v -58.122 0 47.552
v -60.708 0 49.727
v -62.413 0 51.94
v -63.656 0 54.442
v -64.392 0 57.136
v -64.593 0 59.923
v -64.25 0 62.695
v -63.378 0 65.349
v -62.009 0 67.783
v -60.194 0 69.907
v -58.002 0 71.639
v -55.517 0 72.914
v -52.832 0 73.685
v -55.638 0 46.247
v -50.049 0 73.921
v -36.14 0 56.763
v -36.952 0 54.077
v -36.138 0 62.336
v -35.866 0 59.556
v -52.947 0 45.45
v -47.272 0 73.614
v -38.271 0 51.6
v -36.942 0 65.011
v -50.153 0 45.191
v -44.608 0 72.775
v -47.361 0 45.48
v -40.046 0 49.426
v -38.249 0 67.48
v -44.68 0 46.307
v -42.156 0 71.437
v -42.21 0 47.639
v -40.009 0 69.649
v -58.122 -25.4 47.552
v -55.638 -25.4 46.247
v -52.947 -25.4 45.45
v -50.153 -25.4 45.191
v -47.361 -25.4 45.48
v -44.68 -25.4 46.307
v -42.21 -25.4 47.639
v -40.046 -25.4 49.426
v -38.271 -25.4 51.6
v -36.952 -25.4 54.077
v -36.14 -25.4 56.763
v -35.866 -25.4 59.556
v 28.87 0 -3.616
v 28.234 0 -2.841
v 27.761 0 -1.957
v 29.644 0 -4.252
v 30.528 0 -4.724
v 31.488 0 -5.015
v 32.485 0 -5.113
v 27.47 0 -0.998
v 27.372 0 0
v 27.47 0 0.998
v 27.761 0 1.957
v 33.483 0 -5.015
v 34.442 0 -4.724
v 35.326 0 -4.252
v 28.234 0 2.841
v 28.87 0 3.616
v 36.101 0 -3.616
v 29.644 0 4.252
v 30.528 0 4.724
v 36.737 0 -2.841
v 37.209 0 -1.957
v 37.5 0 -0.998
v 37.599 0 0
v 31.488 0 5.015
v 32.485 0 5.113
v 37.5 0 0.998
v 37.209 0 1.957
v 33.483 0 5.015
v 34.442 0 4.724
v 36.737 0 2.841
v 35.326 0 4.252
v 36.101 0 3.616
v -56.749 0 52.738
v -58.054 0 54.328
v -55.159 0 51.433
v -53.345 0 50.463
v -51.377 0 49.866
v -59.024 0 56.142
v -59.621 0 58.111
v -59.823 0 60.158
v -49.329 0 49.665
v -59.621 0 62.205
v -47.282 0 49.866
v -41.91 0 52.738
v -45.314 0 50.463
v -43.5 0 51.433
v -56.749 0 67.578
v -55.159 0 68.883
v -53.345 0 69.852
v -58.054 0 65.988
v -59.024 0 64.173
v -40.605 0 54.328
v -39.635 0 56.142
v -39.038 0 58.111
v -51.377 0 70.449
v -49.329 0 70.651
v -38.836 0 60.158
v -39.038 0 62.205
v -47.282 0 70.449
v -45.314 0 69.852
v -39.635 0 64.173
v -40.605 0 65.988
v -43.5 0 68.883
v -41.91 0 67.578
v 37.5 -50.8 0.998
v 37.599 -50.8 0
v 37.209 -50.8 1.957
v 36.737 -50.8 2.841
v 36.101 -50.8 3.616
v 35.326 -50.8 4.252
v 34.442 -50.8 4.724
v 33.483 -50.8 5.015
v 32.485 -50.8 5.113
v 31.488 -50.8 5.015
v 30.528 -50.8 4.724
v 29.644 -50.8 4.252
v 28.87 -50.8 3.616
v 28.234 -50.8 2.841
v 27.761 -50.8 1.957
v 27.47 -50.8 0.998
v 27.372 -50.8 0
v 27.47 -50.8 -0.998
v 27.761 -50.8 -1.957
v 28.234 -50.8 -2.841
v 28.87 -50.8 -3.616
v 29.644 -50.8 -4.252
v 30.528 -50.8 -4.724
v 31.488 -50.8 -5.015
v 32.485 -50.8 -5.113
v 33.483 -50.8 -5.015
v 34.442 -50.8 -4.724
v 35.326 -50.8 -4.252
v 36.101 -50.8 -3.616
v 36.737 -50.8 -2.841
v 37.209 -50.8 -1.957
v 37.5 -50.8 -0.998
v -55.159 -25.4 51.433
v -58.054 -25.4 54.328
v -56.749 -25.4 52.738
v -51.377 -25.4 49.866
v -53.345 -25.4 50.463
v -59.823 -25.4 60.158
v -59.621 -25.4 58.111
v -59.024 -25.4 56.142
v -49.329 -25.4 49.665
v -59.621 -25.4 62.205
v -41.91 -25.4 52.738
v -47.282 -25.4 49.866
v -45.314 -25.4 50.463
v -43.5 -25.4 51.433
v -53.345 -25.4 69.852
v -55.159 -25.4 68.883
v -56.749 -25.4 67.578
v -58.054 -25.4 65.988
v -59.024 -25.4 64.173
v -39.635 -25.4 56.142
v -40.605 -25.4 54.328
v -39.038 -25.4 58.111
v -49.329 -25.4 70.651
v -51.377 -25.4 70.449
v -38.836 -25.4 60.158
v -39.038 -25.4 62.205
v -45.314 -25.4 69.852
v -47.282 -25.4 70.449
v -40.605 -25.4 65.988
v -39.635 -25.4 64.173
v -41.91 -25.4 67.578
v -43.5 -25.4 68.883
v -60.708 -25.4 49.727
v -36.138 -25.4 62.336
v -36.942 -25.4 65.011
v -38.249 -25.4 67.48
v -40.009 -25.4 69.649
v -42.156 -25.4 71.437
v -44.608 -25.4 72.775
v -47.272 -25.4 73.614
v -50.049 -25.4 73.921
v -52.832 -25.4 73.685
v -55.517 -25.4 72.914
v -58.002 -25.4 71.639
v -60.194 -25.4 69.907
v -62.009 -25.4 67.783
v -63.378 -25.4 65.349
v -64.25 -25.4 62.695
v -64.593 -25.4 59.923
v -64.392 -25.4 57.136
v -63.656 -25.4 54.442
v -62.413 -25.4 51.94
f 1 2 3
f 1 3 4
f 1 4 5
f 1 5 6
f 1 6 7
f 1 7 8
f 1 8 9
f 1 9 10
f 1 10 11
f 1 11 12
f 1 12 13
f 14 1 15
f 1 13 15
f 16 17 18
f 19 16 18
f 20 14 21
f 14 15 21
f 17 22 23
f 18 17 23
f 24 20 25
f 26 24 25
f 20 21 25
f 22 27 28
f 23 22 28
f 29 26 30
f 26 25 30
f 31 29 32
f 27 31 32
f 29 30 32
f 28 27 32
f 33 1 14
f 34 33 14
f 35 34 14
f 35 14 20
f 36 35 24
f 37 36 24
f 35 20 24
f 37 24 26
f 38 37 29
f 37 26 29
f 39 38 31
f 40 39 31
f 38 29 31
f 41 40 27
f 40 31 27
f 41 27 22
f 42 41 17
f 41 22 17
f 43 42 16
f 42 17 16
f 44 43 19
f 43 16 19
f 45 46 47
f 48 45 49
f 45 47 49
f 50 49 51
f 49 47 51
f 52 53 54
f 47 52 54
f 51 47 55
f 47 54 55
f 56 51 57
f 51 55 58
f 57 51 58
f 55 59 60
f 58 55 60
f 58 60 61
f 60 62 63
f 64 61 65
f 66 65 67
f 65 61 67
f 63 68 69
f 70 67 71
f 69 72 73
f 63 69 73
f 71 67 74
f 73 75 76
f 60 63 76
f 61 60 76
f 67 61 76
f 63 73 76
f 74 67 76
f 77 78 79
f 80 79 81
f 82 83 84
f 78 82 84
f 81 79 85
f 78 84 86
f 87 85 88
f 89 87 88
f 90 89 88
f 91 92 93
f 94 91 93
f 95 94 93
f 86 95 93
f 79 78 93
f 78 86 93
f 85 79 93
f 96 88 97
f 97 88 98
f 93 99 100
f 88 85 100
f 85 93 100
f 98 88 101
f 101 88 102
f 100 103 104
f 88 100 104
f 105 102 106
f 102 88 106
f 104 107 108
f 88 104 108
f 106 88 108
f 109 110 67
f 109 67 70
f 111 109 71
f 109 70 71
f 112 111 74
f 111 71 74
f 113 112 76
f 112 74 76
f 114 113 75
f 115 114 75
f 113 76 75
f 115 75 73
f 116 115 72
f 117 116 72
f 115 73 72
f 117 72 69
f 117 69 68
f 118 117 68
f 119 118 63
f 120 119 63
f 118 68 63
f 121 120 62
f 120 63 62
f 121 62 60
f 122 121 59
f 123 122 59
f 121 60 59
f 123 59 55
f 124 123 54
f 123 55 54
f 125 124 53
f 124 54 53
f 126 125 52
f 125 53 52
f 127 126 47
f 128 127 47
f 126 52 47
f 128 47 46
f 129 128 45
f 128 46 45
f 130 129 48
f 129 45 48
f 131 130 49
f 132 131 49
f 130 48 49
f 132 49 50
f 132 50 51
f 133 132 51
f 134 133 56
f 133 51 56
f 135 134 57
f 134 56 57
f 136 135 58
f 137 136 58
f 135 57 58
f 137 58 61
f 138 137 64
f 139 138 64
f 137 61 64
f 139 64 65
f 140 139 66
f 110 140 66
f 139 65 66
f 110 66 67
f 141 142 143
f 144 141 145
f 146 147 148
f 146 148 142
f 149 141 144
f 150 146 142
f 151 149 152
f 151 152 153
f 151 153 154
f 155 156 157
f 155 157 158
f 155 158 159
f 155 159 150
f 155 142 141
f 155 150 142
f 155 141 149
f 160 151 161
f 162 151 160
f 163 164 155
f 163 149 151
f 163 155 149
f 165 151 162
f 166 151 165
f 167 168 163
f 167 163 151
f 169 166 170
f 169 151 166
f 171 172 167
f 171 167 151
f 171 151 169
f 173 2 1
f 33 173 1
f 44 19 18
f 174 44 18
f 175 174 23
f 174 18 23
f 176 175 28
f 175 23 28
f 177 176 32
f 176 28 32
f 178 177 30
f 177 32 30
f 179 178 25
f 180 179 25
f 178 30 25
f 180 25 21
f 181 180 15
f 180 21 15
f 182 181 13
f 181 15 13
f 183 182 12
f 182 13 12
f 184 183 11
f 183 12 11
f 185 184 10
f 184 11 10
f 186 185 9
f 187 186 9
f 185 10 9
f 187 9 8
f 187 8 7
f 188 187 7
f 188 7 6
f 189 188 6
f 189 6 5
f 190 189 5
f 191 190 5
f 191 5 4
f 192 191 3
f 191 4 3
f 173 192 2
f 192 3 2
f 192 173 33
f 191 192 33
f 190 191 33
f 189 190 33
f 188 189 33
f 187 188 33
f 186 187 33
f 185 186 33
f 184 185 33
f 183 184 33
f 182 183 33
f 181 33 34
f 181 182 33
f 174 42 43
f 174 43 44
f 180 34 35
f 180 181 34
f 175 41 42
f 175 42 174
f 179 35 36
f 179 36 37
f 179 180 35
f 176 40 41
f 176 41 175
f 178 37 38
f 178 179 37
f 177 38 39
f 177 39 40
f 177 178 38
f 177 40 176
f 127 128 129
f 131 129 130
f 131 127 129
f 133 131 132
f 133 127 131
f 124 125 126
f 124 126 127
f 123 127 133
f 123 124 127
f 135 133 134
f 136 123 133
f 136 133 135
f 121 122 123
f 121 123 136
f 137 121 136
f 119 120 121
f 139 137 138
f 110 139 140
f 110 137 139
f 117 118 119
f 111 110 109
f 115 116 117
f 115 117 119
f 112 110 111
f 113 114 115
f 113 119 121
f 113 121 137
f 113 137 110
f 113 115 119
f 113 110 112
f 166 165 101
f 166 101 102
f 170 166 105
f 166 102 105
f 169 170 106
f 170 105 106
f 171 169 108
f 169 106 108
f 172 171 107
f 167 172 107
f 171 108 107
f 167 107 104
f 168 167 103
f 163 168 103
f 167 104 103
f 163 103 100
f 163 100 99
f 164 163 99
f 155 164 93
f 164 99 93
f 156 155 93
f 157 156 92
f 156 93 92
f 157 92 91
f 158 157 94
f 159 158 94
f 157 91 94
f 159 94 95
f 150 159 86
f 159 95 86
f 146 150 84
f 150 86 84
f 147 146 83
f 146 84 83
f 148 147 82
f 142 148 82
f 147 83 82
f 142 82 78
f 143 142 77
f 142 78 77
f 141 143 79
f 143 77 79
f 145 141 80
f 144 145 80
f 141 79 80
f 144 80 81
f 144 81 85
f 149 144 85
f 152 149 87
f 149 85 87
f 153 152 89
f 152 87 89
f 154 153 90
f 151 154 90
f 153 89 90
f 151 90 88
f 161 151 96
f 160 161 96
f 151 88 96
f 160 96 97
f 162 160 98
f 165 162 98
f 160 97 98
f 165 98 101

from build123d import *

# Parameters (mm, degrees)
F1_R     = 5.1134214737
F2_DEPTH = 25.4
F1_R_2   = 10.493198269
F3_DEPTH = 25.4


with BuildPart() as f2:
    # F1 (on face) → F2 (new body)
    with BuildSketch(Plane.XZ):
        with Locations((32.4852615595, 0)):
            Circle(F1_R)
    extrude(amount=F2_DEPTH)

    # F3 (add): faces of the model
    f3_faces = [f2.faces().sort_by_distance(p)[0] for p in [
        (32.4852615595, -25.4, 0),
        (32.4852615595, 0, 0),
    ]]
    extrude(f3_faces, amount=F3_DEPTH, dir=(0, -1, 0))


with BuildPart() as f2b:
    # F1 (on face) → F2, piece 2 (new body)
    with BuildSketch(Plane.XZ):
        with Locations((-49.3294745684, 60.1578950882)):
            Circle(F1_R_2)
    extrude(amount=F2_DEPTH)


with BuildPart() as f2c:
    # F0 (on Front) → F2, piece 3 (new body)
    with BuildSketch(Plane.XZ):
        with BuildLine():
            Line((-60.7084391338, 49.72713364), (-58.122426899, 47.5517098229))
            ThreePointArc((-58.122426899, 47.5517098229), (-43.4120738376, 46.9126378705), (-35.8661949138, 59.5563165843))
            ThreePointArc((-35.8661949138, 59.5563165843), (-55.517144105, 72.9143659857), (-60.7084391338, 49.72713364))
        make_face()
    extrude(amount=F2_DEPTH)


solid = Compound([f2.part, f2b.part, f2c.part])
